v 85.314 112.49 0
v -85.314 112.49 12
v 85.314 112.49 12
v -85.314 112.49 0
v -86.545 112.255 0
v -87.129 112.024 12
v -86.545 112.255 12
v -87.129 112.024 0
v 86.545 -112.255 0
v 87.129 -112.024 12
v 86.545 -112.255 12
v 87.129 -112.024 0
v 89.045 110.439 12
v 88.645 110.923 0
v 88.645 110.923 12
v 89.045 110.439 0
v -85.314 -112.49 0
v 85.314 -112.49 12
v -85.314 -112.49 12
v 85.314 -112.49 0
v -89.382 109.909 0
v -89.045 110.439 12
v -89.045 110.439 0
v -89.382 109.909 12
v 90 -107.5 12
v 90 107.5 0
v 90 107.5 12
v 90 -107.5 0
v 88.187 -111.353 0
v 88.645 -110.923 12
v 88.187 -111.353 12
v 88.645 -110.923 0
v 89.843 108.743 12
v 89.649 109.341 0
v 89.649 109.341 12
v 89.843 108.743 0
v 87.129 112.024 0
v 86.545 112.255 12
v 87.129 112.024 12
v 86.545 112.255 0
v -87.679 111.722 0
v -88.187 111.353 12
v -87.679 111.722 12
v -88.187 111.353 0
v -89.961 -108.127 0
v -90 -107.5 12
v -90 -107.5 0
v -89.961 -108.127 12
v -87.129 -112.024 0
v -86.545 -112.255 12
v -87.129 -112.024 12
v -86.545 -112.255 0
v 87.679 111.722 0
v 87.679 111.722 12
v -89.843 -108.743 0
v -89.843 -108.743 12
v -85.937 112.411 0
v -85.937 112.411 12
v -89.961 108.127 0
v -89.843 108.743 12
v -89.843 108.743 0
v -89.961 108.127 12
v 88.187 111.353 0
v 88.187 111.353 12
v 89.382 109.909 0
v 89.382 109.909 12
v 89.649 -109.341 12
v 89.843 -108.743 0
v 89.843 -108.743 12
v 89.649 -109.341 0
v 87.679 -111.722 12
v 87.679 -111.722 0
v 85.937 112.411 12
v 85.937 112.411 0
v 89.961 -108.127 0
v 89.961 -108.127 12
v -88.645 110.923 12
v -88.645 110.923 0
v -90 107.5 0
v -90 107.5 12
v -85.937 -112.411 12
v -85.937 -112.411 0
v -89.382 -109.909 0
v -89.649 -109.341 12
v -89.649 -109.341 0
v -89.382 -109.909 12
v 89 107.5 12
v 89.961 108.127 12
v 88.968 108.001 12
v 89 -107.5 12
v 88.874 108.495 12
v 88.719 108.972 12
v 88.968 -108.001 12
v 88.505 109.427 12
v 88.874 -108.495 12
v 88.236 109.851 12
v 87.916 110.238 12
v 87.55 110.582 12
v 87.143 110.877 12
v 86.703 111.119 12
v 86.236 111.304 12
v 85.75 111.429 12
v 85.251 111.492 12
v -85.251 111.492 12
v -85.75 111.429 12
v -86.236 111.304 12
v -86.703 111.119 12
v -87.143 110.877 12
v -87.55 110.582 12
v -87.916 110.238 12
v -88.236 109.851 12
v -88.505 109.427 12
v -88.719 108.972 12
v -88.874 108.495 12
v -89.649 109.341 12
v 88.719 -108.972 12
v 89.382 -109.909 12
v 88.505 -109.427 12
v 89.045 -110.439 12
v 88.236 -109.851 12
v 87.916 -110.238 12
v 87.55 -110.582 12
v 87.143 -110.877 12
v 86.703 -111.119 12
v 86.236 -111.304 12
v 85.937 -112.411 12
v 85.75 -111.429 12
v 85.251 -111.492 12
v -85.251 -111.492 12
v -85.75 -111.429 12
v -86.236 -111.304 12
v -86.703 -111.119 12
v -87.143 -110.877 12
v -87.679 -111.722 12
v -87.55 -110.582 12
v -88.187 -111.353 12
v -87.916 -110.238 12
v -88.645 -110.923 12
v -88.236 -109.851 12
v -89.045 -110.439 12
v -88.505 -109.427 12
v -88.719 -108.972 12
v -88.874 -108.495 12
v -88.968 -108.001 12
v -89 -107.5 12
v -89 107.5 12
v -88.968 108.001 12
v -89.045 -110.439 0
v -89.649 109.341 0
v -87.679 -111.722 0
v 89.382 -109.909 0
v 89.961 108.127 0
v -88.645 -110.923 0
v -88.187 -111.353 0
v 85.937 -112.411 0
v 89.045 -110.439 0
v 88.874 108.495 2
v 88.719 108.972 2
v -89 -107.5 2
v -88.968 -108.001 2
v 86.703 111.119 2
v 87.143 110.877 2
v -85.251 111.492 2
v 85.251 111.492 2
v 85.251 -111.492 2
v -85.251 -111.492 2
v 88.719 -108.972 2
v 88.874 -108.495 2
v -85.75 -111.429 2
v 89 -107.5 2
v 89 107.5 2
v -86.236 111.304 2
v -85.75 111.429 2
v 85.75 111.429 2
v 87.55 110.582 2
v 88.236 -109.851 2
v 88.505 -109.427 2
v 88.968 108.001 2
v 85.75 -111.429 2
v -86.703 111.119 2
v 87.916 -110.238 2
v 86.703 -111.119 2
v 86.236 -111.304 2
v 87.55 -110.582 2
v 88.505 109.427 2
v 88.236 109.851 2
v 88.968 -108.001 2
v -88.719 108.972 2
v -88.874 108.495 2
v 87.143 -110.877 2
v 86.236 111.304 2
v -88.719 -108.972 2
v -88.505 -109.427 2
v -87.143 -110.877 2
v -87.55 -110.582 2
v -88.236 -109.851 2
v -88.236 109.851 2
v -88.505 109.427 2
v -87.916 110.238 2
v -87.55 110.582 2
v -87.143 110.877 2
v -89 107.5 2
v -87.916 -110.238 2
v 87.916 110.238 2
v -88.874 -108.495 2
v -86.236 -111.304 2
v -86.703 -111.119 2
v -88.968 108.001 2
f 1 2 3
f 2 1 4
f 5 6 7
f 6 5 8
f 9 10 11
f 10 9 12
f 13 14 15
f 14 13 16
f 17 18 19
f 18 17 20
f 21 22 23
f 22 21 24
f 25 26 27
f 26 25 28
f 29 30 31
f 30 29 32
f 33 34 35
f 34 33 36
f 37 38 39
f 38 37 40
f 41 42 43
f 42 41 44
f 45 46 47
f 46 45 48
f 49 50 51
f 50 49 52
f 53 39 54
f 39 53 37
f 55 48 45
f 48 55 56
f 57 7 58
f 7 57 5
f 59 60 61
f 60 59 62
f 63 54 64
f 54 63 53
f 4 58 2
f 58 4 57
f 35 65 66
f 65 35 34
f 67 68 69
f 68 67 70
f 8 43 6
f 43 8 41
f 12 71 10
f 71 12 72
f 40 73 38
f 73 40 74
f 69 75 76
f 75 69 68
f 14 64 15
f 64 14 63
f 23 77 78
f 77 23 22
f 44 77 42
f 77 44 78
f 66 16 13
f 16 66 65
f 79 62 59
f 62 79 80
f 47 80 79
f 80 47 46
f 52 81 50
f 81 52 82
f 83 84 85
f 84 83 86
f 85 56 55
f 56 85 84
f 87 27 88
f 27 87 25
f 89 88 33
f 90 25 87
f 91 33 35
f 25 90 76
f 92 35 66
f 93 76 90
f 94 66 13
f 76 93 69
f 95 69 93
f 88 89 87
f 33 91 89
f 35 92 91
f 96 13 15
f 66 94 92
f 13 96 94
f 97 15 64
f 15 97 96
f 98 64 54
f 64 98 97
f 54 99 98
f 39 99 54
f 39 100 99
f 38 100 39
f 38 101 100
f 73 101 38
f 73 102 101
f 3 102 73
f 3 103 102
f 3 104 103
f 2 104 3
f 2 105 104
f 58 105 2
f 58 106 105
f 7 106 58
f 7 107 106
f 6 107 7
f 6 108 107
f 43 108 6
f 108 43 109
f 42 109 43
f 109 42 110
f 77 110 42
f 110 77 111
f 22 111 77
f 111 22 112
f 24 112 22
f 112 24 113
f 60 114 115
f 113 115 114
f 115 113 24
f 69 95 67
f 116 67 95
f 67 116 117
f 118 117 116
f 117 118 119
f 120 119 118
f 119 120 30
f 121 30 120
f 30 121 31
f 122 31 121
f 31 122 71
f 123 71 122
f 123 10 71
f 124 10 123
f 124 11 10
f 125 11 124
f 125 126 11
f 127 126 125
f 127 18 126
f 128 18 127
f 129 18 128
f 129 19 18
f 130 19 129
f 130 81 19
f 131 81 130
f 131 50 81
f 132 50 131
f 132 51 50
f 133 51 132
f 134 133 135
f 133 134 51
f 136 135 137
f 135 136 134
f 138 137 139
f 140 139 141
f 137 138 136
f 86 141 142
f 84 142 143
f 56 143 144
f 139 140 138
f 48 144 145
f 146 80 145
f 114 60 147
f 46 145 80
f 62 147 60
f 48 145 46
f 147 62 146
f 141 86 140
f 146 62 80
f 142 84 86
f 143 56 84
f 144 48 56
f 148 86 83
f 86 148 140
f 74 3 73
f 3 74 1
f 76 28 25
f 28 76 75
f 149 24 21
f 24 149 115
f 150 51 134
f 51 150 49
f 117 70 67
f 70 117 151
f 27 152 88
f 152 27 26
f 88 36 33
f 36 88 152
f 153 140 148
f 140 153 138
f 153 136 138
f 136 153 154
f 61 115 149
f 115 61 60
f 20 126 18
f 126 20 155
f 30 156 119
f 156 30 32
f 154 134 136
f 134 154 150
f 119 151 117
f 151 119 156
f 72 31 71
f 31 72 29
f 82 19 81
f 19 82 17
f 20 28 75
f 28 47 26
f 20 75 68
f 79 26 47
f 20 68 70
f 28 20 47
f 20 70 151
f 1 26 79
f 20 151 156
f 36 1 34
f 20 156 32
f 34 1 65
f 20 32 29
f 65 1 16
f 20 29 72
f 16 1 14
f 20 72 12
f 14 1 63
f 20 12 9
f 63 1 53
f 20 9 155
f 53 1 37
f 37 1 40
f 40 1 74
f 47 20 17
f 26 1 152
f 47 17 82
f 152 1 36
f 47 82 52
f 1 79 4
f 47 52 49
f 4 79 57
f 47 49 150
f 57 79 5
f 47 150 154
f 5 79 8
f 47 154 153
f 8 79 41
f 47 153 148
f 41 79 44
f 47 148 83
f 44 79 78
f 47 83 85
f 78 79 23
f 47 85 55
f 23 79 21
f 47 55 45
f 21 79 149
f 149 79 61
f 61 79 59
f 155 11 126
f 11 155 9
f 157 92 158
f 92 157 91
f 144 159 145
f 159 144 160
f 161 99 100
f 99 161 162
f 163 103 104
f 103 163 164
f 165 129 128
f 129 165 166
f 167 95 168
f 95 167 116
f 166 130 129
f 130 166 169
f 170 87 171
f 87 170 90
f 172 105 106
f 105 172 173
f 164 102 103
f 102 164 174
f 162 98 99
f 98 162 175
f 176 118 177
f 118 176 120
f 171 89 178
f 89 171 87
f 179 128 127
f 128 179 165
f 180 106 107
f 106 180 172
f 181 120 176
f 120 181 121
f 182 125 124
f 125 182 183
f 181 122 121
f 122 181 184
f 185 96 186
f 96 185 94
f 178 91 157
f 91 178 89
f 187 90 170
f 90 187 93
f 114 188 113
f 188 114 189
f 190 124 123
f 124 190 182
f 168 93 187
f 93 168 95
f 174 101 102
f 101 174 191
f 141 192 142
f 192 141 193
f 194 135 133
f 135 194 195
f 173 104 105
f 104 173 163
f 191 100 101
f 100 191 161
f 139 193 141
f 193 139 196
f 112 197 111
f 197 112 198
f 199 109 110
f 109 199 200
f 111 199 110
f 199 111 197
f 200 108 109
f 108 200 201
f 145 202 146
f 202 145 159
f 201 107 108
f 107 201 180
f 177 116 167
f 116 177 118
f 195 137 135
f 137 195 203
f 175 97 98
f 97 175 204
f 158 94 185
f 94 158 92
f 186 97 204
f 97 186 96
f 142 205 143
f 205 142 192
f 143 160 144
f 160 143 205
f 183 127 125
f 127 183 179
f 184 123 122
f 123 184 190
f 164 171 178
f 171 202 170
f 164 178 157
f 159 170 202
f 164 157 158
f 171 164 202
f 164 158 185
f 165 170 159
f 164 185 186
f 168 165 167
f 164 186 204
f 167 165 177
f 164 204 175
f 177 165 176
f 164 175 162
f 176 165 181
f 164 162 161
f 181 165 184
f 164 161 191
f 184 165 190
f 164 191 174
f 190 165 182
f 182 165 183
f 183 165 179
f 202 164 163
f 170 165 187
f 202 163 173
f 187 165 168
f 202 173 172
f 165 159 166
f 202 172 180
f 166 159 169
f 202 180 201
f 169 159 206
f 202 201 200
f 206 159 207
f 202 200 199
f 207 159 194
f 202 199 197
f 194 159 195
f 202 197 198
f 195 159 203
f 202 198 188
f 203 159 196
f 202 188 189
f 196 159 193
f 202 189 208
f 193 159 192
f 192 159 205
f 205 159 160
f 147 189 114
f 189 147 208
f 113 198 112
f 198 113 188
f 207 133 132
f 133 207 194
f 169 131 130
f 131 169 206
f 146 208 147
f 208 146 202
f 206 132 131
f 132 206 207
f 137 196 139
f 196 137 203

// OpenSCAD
$fn = 50;


difference() {
	union() {
		hull() {
			translate(v = [-85.0000000000, 107.5000000000, 0]) {
				cylinder(h = 12, r = 5);
			}
			translate(v = [85.0000000000, 107.5000000000, 0]) {
				cylinder(h = 12, r = 5);
			}
			translate(v = [-85.0000000000, -107.5000000000, 0]) {
				cylinder(h = 12, r = 5);
			}
			translate(v = [85.0000000000, -107.5000000000, 0]) {
				cylinder(h = 12, r = 5);
			}
		}
	}
	union() {
		translate(v = [0, 0, 2]) {
			hull() {
				translate(v = [-85.0000000000, 107.5000000000, 0]) {
					cylinder(h = 10, r = 4);
				}
				translate(v = [85.0000000000, 107.5000000000, 0]) {
					cylinder(h = 10, r = 4);
				}
				translate(v = [-85.0000000000, -107.5000000000, 0]) {
					cylinder(h = 10, r = 4);
				}
				translate(v = [85.0000000000, -107.5000000000, 0]) {
					cylinder(h = 10, r = 4);
				}
			}
		}
	}
}
